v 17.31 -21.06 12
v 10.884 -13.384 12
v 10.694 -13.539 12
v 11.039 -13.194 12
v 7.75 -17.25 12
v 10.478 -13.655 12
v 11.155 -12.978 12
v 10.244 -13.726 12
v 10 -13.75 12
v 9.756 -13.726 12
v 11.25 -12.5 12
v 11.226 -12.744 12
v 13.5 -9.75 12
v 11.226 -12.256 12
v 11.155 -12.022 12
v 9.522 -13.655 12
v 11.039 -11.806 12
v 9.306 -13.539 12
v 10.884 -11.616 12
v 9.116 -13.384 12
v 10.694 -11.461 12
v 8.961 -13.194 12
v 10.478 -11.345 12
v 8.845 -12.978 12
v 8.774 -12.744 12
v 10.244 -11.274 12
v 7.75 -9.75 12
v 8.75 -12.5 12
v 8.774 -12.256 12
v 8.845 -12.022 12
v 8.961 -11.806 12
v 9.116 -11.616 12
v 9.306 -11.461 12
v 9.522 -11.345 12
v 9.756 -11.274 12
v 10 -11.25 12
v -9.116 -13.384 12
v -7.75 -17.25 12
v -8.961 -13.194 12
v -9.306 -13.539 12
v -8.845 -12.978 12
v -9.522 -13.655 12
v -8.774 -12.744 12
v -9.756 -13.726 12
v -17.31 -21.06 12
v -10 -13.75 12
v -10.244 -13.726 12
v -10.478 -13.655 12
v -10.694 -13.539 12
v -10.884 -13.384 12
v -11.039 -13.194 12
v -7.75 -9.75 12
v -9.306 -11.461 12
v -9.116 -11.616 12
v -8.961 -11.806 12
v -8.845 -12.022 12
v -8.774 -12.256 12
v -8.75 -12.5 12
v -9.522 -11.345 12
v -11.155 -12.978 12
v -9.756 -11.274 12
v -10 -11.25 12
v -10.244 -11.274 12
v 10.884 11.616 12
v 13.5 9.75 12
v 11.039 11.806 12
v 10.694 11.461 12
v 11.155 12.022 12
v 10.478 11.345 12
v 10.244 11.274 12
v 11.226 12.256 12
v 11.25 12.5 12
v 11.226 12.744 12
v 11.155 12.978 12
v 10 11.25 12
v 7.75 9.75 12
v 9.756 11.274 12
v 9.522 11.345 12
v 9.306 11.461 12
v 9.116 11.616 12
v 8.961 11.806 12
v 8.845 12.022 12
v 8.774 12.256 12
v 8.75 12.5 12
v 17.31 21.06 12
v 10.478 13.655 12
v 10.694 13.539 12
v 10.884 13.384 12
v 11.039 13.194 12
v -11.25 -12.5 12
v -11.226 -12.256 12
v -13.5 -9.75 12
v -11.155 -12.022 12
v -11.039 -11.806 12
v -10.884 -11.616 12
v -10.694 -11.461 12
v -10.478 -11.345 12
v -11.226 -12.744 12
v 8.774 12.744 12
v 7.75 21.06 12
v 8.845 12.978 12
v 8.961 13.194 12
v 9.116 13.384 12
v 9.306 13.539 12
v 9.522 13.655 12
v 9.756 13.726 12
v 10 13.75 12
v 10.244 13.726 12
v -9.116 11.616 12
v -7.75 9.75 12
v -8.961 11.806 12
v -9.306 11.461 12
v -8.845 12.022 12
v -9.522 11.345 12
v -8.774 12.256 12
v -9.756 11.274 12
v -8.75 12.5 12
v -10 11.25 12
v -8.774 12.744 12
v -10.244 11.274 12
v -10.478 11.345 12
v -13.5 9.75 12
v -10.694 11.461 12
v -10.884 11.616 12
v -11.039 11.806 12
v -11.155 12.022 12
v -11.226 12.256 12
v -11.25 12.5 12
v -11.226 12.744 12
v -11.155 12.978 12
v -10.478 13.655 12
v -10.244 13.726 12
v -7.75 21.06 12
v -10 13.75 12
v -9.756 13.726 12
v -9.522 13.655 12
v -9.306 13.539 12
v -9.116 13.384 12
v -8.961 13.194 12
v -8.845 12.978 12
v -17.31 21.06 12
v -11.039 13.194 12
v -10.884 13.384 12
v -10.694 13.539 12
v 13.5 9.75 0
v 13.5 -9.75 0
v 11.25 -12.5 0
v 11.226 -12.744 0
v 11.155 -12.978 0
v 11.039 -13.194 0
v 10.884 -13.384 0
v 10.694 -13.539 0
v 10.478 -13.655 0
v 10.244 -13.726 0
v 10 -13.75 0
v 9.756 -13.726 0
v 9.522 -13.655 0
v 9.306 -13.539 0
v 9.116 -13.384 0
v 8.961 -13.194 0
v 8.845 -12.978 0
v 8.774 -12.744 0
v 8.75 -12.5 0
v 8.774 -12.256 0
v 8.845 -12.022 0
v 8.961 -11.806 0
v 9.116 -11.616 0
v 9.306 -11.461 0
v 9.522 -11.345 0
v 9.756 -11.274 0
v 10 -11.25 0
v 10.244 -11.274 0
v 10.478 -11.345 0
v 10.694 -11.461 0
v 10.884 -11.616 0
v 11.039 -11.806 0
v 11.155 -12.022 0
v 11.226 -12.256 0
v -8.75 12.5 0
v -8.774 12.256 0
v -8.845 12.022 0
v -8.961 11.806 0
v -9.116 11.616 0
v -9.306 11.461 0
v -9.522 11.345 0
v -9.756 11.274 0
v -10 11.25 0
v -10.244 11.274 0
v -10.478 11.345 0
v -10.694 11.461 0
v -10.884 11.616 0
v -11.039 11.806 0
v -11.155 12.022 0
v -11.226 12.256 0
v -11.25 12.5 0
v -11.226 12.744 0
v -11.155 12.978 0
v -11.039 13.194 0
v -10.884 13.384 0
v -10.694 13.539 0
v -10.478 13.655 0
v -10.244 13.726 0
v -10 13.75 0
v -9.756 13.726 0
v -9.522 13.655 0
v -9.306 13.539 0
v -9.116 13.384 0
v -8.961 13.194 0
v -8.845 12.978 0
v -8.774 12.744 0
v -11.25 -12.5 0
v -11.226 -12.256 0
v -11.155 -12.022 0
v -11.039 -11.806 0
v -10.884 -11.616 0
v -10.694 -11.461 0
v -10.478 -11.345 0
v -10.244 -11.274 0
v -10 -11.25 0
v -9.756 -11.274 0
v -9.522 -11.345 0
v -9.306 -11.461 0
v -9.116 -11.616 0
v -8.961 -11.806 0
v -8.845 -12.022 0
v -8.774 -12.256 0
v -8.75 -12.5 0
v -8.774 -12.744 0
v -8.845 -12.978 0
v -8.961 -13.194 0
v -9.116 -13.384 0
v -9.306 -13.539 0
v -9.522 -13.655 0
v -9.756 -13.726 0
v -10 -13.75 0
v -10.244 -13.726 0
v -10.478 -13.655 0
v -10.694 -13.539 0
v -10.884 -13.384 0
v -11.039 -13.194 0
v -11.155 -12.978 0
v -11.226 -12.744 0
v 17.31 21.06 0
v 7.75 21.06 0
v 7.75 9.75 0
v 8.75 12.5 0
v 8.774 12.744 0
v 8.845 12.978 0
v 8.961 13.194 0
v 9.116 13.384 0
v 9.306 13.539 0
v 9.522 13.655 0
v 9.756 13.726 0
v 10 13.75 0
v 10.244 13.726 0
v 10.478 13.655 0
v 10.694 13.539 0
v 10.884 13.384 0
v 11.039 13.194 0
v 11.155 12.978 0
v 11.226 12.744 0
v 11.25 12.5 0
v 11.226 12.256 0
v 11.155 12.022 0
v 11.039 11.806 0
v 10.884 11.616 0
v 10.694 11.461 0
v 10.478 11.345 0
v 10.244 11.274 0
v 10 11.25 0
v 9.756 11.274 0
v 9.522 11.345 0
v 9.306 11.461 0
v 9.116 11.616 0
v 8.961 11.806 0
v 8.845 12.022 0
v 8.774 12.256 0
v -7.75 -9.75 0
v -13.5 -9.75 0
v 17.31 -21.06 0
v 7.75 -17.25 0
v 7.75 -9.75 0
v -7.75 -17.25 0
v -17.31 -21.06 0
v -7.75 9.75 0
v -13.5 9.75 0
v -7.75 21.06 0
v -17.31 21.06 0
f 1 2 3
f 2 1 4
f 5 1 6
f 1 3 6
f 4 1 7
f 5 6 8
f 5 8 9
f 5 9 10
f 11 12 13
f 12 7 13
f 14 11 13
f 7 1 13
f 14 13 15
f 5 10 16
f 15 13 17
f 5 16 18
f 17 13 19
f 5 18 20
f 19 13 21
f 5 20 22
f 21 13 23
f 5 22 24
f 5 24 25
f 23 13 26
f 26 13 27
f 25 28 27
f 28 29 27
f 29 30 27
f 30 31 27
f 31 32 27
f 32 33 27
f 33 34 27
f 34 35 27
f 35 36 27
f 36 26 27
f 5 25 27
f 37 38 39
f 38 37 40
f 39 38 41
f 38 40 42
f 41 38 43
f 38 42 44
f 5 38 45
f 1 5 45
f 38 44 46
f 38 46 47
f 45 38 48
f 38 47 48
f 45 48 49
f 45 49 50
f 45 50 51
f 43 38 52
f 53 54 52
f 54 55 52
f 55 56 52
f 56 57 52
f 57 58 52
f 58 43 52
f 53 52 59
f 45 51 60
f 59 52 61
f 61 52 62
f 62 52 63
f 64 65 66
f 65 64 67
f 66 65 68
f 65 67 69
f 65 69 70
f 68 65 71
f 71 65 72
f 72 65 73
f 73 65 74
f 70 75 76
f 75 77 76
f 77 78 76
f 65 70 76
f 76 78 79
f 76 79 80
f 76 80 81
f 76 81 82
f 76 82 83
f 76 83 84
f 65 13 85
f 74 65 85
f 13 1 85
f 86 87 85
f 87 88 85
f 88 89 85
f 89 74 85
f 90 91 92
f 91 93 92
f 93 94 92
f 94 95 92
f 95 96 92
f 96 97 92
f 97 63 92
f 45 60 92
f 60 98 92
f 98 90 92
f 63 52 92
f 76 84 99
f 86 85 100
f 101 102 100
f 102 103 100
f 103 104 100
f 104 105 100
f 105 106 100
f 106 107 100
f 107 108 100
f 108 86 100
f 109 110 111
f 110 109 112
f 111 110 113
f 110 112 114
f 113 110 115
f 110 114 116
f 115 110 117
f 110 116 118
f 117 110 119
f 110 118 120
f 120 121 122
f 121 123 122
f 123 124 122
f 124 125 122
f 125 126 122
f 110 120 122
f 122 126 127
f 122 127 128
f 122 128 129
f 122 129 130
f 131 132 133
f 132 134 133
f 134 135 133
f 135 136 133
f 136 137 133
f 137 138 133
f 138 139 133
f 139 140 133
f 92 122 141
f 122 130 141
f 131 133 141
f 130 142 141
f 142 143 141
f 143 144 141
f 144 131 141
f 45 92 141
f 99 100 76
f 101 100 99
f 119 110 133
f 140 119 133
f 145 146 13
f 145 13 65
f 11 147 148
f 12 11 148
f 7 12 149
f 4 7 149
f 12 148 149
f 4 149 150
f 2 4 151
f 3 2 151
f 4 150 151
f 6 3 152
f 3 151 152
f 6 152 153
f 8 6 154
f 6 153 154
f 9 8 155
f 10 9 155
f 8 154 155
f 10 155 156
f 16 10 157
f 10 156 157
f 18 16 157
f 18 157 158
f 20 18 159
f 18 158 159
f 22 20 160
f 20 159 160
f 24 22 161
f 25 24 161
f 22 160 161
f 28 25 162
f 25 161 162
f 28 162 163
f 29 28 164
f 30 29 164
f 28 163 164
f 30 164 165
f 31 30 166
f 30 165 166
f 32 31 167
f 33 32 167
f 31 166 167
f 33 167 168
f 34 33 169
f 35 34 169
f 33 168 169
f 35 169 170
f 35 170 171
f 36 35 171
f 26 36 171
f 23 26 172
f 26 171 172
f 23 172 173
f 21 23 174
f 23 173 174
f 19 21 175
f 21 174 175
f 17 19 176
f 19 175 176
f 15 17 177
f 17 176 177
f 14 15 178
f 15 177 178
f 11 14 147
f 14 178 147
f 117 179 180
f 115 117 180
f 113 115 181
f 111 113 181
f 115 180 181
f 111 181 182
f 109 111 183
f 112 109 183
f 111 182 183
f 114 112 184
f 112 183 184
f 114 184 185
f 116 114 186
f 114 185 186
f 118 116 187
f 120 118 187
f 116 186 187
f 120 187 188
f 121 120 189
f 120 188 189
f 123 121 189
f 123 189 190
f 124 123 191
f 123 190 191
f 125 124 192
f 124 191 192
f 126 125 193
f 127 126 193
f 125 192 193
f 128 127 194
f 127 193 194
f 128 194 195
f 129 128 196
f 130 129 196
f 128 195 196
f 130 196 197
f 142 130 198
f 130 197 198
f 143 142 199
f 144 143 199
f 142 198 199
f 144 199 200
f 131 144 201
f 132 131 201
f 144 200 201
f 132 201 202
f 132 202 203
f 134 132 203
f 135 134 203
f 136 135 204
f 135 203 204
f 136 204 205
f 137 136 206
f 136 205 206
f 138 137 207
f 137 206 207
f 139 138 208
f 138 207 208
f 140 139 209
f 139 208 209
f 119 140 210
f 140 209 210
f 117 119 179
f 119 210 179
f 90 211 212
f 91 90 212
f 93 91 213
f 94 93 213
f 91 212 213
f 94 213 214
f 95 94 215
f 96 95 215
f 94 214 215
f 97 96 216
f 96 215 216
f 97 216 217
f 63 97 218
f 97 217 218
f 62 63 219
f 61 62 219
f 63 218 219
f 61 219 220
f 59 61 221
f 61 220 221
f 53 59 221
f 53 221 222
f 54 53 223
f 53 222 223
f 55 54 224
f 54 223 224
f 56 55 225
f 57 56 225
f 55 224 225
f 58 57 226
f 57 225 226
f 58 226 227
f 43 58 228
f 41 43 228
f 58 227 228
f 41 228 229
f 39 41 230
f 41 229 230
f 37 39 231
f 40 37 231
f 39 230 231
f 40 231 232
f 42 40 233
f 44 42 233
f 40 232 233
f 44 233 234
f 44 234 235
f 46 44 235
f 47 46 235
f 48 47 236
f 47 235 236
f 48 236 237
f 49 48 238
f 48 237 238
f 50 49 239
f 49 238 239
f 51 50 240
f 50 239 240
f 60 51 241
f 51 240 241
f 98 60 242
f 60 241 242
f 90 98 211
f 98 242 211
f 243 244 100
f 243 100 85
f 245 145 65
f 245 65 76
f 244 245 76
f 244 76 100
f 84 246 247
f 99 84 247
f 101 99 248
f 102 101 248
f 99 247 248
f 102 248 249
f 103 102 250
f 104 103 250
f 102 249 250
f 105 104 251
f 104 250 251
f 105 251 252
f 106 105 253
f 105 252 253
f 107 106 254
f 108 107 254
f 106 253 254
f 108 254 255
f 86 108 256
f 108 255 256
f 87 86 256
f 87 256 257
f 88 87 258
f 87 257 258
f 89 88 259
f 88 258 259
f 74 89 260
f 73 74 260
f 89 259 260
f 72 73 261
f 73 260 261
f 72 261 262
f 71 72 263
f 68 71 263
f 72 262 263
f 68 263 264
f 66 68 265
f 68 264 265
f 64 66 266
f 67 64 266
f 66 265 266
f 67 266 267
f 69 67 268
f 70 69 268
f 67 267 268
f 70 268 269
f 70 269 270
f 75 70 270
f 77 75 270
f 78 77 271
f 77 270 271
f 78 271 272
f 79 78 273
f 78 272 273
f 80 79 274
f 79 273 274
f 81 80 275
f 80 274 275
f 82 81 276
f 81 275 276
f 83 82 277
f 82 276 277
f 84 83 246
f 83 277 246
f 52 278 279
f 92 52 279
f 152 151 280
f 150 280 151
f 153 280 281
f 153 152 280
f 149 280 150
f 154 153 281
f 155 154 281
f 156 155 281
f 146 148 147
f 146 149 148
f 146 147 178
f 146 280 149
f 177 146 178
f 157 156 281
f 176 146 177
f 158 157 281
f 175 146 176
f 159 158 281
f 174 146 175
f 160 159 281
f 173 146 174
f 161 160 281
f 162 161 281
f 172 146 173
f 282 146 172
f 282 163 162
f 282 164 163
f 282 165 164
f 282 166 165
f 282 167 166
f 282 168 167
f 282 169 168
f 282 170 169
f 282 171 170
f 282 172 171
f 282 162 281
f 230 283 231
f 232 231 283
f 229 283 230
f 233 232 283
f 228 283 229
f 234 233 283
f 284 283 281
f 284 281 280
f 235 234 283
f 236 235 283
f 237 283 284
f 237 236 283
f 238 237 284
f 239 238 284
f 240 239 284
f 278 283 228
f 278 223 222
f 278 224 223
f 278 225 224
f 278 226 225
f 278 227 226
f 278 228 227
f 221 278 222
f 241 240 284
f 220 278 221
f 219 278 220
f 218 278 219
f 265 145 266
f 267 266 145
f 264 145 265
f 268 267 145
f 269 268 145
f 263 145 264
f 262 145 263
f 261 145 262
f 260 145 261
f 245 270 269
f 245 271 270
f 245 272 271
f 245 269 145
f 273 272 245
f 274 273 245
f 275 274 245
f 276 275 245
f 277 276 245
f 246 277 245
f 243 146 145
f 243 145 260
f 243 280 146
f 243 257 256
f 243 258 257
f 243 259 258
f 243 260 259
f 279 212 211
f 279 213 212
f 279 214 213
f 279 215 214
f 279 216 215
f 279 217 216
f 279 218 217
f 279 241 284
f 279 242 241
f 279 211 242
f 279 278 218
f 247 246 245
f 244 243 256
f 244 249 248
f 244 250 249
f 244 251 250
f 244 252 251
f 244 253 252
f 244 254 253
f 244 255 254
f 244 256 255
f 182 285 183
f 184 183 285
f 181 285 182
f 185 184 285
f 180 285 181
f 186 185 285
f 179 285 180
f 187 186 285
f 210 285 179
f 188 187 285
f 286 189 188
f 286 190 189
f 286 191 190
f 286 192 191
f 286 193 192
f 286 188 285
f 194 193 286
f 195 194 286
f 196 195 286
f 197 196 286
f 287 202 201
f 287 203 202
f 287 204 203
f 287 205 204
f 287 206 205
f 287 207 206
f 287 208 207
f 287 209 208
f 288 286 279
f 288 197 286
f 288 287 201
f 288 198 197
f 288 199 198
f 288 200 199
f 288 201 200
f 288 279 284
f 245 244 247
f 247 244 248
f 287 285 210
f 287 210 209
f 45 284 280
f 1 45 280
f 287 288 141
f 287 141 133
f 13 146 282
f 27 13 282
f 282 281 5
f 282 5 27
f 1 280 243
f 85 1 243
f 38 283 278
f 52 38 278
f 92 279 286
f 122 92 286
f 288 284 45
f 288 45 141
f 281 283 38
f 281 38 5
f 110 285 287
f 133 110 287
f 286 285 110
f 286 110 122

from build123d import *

# Parameters (mm, degrees)
SKETCH1_W           = 34.62
SKETCH1_H           = 42.12
SKETCH1_W_2         = 27
SKETCH1_H_2         = 34.5
BOSS_EXTRUDE1_DEPTH = 12
SKETCH2_W           = 5.75
SKETCH2_H           = 7.5
SKETCH2_R           = 1.25
BOSS_EXTRUDE2_DEPTH = 12
SKETCH3_W           = 15.5
SKETCH3_H           = 3.81
CUT_EXTRUDE1_DEPTH  = 30.785226204


with BuildPart() as part:
    # Sketch1 → Boss-Extrude1 (new body)
    with BuildSketch(Plane.XY):
        Rectangle(SKETCH1_W, SKETCH1_H)
        Rectangle(SKETCH1_W_2, SKETCH1_H_2, mode=Mode.SUBTRACT)
    extrude(amount=BOSS_EXTRUDE1_DEPTH)

    # Sketch2 → Boss-Extrude2 (add, through all)
    # profile 1 of 4: a face of its own
    with BuildSketch(Plane(origin=(0, 0, 0), x_dir=(-1, 0, 0), z_dir=(0, 0, -1))):
        with Locations((-10.625, 13.5)):
            Rectangle(SKETCH2_W, SKETCH2_H)
        with Locations((-10, 12.5)):
            Circle(SKETCH2_R, mode=Mode.SUBTRACT)
    # profile 2 of 4: a face of its own
    with BuildSketch(Plane(origin=(0, 0, 0), x_dir=(-1, 0, 0), z_dir=(0, 0, -1))):
        with Locations((10.625, 13.5)):
            Rectangle(SKETCH2_W, SKETCH2_H)
        with Locations(Location((10, 12.5, 0), (0, 0, 180))):
            Circle(SKETCH2_R, mode=Mode.SUBTRACT)
    # profile 3 of 4: a face of its own
    with BuildSketch(Plane(origin=(0, 0, 0), x_dir=(-1, 0, 0), z_dir=(0, 0, -1))):
        with Locations((10.625, -13.5)):
            Rectangle(SKETCH2_W, SKETCH2_H)
        with Locations((10, -12.5)):
            Circle(SKETCH2_R, mode=Mode.SUBTRACT)
    # profile 4 of 4: a face of its own
    with BuildSketch(Plane(origin=(0, 0, 0), x_dir=(-1, 0, 0), z_dir=(0, 0, -1))):
        with Locations((-10.625, -13.5)):
            Rectangle(SKETCH2_W, SKETCH2_H)
        with Locations(Location((-10, -12.5, 0), (0, 0, 180))):
            Circle(SKETCH2_R, mode=Mode.SUBTRACT)
    extrude(amount=-BOSS_EXTRUDE2_DEPTH)

    # Sketch3 → Cut-Extrude1 (cut, through all)
    with BuildSketch(Plane(origin=(0, 0, 0), x_dir=(-1, 0, 0), z_dir=(0, 0, -1))):
        with Locations((0, 19.155)):
            Rectangle(SKETCH3_W, SKETCH3_H)
    extrude(amount=-CUT_EXTRUDE1_DEPTH, mode=Mode.SUBTRACT)


solid = part.part
